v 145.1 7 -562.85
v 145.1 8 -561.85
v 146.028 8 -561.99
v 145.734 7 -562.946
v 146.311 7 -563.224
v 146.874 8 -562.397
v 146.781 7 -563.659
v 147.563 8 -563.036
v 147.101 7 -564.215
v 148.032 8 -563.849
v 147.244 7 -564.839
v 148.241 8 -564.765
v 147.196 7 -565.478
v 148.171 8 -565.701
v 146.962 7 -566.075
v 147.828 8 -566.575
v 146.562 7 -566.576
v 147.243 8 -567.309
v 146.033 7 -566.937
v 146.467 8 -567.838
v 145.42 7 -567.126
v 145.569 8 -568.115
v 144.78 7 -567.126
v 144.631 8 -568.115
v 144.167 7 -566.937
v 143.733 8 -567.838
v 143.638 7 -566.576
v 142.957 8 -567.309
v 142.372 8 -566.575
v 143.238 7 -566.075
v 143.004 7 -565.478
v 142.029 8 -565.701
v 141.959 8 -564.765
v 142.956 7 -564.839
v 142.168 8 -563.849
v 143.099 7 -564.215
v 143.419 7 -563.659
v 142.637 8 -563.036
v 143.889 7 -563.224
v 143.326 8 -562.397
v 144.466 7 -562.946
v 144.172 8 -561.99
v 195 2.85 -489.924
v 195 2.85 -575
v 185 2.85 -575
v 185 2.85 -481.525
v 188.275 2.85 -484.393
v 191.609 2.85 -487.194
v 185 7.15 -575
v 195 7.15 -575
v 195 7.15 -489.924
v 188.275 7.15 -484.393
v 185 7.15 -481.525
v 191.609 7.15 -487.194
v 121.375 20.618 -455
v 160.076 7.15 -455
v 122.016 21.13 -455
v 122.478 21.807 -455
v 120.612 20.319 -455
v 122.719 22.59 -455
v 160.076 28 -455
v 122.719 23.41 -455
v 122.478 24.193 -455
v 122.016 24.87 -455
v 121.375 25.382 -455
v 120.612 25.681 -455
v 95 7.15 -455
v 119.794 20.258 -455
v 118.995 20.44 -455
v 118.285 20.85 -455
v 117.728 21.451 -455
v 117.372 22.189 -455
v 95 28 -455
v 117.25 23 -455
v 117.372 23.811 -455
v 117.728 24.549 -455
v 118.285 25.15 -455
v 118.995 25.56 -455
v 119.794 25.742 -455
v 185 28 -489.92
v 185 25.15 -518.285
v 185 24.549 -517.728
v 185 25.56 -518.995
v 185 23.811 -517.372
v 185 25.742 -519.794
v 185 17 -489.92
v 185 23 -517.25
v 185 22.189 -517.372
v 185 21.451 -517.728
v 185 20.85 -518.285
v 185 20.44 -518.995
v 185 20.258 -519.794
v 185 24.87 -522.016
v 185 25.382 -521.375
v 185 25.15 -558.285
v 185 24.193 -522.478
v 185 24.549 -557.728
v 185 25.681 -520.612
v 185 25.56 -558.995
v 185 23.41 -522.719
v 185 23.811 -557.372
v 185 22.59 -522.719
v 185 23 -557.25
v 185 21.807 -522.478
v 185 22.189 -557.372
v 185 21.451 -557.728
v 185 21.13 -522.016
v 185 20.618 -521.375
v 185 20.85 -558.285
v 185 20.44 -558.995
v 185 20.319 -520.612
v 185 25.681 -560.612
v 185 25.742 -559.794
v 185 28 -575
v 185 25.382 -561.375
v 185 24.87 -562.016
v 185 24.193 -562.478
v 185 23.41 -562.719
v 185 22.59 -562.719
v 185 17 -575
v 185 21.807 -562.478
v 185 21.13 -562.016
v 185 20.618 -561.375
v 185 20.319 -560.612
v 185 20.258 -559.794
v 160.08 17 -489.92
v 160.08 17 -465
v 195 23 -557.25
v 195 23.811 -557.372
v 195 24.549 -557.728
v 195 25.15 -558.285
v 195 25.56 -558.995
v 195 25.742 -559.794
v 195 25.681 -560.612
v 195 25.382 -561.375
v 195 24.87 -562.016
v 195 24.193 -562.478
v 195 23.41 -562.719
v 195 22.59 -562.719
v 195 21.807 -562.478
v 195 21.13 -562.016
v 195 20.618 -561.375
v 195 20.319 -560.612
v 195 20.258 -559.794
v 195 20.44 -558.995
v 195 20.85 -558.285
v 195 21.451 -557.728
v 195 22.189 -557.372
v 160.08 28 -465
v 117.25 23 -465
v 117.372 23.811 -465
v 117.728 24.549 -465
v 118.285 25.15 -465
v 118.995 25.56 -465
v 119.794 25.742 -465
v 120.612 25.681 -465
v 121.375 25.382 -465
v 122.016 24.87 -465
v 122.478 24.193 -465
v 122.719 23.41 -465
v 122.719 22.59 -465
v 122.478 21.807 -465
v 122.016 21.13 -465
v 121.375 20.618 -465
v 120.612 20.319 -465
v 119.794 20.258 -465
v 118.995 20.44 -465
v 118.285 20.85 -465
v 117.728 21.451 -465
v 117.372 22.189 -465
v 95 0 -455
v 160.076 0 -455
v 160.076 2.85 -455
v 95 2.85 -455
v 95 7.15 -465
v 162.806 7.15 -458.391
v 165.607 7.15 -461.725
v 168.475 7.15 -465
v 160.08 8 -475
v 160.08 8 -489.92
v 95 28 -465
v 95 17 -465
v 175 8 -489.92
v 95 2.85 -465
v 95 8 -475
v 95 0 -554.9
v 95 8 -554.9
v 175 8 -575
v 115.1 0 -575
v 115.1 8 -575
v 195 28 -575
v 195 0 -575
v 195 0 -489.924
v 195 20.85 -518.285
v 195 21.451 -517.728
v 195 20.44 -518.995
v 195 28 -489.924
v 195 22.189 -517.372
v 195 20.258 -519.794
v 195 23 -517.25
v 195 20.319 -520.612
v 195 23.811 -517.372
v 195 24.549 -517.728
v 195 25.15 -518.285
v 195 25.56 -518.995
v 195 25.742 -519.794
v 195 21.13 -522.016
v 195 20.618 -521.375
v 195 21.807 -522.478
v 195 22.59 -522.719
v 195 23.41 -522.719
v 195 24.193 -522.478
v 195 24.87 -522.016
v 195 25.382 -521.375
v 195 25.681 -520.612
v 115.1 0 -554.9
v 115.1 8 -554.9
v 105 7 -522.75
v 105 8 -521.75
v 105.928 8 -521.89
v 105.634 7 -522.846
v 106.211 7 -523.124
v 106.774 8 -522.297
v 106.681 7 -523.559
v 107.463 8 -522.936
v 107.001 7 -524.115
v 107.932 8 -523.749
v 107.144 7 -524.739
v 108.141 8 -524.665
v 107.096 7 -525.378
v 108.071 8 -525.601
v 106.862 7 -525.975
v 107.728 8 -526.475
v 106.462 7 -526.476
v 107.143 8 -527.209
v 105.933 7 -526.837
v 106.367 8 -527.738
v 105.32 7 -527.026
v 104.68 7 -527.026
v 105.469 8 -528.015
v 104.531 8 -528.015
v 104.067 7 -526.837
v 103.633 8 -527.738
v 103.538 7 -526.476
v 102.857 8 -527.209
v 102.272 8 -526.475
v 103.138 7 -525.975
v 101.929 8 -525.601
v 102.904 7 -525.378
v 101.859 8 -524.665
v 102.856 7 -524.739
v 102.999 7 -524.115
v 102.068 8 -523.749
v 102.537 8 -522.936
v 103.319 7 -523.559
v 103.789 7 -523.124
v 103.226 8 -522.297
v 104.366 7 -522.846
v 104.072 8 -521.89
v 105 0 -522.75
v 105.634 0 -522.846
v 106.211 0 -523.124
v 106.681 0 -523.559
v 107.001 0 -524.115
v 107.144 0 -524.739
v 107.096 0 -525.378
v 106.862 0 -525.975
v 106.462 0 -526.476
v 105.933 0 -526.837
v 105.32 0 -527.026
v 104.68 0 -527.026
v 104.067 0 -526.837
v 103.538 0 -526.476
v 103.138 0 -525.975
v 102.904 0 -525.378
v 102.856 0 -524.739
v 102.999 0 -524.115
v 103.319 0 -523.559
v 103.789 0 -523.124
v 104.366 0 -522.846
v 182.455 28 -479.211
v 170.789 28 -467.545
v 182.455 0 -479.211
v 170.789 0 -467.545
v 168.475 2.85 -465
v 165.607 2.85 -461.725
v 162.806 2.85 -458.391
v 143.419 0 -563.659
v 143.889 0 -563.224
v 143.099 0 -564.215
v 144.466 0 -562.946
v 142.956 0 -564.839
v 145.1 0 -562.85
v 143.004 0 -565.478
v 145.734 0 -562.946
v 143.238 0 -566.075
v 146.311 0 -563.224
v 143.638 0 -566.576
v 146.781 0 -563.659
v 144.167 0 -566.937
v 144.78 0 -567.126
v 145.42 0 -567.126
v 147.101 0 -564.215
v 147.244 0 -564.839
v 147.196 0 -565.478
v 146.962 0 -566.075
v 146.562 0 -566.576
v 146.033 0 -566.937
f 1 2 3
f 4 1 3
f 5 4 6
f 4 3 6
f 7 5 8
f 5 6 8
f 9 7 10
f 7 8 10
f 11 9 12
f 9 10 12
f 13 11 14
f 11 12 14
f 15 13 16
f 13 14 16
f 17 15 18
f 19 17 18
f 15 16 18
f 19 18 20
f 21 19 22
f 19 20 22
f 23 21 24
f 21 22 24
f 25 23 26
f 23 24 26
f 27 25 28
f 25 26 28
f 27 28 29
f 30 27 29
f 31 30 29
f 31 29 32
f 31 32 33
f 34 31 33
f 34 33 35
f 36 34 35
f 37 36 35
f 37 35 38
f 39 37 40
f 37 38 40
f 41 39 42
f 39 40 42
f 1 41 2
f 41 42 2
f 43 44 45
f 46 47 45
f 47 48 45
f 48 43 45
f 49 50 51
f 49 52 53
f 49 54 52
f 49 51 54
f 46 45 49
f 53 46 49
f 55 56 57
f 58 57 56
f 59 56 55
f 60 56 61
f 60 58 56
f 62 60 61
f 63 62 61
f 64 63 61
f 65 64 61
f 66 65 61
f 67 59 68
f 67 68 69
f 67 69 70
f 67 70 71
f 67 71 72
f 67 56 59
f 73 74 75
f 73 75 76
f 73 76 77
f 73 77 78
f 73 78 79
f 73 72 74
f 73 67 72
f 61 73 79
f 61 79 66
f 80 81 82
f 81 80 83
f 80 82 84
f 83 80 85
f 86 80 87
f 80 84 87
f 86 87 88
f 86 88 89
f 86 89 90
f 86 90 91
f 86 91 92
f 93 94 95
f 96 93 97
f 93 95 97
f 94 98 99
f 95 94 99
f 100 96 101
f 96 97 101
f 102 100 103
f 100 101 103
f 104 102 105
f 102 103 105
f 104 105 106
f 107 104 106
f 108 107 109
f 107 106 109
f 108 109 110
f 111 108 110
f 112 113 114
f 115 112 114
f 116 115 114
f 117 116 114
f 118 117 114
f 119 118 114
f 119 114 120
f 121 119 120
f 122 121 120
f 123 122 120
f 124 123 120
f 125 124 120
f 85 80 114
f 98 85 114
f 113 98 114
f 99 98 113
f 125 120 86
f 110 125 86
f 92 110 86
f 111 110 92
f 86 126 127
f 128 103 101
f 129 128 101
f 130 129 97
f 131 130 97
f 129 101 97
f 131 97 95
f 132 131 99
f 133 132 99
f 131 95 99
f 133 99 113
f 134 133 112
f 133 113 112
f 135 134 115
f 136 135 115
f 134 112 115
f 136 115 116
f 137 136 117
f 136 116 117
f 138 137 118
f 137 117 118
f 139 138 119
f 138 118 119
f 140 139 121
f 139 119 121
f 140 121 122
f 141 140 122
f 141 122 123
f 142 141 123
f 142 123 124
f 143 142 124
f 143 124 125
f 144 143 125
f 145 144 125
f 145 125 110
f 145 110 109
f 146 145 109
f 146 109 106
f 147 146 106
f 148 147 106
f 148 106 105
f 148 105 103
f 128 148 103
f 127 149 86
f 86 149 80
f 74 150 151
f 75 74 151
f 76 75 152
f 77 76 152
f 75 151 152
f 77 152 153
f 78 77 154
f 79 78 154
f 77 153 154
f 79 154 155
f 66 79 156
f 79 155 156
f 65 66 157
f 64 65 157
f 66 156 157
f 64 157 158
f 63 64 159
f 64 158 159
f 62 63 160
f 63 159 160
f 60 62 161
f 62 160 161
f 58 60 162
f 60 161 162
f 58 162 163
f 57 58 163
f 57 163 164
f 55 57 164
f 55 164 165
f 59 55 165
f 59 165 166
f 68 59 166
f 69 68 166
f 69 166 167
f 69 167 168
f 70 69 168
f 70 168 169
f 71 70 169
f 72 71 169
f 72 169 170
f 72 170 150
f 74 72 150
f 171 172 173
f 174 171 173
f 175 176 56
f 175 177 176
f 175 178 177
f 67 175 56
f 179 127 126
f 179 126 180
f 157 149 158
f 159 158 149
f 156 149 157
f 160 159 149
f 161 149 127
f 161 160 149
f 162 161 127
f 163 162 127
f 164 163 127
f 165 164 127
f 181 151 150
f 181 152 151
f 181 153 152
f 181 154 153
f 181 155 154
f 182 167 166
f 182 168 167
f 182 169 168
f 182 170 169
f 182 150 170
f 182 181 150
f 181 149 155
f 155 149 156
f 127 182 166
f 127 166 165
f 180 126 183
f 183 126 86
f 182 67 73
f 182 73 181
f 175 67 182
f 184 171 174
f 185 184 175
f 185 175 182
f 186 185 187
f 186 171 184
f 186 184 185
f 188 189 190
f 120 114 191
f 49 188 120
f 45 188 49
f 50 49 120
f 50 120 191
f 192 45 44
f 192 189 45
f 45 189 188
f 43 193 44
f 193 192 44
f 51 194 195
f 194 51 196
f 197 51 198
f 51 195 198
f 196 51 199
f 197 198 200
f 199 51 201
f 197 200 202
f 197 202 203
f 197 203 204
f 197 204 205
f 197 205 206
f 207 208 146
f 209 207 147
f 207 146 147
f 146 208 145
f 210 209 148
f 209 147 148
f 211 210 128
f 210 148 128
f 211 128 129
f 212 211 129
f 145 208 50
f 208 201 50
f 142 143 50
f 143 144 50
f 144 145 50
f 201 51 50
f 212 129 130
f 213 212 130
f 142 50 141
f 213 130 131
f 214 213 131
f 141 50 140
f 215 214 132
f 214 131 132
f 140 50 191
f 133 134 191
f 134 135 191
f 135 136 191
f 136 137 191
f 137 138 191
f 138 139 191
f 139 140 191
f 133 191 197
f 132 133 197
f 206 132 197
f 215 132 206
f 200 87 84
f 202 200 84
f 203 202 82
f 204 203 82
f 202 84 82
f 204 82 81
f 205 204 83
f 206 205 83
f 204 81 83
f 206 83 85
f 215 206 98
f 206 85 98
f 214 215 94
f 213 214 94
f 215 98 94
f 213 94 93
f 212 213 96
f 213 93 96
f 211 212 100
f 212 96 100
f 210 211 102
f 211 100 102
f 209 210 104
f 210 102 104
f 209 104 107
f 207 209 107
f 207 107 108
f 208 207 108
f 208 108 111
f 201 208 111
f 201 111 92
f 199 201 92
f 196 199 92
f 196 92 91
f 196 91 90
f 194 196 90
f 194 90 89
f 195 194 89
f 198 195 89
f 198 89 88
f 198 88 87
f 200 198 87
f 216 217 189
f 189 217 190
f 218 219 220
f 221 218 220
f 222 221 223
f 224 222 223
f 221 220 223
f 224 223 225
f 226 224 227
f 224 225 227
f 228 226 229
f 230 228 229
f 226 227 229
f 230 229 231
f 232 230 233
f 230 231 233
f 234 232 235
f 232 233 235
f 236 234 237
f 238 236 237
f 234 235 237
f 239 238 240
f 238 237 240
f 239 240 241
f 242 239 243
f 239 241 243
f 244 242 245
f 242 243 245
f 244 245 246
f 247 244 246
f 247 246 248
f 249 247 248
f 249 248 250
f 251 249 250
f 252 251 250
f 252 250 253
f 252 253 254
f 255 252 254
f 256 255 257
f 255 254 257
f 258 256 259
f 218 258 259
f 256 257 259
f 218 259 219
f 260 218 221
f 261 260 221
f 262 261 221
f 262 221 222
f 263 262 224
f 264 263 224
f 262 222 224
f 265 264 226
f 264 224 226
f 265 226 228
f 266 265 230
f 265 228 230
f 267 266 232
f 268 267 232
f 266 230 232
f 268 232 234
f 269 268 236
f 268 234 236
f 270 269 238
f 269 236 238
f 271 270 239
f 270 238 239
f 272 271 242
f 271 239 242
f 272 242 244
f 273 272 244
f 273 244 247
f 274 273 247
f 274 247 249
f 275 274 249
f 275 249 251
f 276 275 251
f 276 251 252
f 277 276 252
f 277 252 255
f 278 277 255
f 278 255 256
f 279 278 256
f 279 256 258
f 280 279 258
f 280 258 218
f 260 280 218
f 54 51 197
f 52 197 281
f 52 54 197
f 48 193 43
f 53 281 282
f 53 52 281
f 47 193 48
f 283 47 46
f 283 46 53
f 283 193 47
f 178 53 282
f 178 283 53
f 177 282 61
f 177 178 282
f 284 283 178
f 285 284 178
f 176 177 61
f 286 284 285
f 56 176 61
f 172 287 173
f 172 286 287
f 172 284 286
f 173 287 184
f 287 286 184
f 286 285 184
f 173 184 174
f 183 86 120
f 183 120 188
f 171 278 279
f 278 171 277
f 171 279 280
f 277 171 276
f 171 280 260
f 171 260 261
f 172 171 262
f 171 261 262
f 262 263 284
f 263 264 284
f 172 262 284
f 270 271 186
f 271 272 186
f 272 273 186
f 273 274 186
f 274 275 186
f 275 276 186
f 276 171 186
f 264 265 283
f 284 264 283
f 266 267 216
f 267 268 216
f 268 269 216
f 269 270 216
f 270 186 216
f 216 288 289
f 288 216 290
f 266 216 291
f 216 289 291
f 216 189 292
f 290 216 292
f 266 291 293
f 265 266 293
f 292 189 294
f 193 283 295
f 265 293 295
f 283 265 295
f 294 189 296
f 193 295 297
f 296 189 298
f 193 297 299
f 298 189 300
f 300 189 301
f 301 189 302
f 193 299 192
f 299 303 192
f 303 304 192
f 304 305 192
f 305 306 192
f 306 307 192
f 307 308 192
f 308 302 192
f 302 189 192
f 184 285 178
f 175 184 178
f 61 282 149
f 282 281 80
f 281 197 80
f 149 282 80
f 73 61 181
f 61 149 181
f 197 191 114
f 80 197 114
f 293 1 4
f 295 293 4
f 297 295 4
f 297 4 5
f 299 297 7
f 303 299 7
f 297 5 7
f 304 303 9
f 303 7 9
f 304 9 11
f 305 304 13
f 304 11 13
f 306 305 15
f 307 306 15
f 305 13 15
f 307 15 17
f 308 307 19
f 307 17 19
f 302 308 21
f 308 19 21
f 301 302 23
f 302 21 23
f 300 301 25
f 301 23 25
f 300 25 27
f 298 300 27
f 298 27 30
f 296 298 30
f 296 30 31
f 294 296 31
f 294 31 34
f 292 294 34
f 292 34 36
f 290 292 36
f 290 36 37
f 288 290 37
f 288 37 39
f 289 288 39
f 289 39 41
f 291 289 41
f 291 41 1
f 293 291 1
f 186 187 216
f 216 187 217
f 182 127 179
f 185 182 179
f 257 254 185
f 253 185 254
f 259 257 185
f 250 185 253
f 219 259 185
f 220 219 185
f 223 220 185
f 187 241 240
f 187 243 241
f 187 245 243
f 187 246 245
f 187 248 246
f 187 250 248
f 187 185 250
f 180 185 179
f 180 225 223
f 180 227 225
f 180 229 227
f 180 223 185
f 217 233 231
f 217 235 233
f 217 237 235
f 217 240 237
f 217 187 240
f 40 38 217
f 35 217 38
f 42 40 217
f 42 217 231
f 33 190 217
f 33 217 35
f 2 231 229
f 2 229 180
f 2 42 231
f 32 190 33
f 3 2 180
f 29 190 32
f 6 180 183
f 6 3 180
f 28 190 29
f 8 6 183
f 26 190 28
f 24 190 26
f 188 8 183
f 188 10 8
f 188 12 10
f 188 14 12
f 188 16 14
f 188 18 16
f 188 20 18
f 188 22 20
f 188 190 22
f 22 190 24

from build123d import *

# Parameters (mm, degrees)
SKETCH1_W                = 650
SKETCH1_H                = 650
BOSS_EXTRUDE1_DEPTH      = 8
BOSS_EXTRUDE2_DEPTH      = 650
CUT_EXTRUDE2_DEPTH       = 921.277302922
CUT_EXTRUDE2_DEPTH_BACK  = 921.277302922
SKETCH4_R                = 11
CUT_EXTRUDE1_DEPTH       = 920.932062709
CUT_EXTRUDE1_DEPTH_BACK  = 920.932062709
SKETCH2_R                = 210
CUT_EXTRUDE3_DEPTH       = 921.277302998
CUT_EXTRUDE3_DEPTH_BACK  = 110
CUT_EXTRUDE4_DEPTH       = 110
CUT_EXTRUDE5_DEPTH       = 920.932062713
CUT_EXTRUDE5_DEPTH_BACK  = 920.932062713
SKETCH7_OUTSIDE_W        = 836.056
SKETCH7_OUTSIDE_H        = 836.056
BOSS_EXTRUDE3_DEPTH      = 160.08
BOSS_EXTRUDE4_DEPTH      = 160.08
SKETCH21_W               = 10
SKETCH21_H               = 4.3
CUT_EXTRUDE10_DEPTH      = 680.197320372
SKETCH22_W               = 10
SKETCH22_H               = 4.3
CUT_EXTRUDE11_DEPTH      = 278.189465889
BOSS_EXTRUDE5_DEPTH      = 60
CUT_EXTRUDE6_DEPTH       = 679.914574891
CUT_EXTRUDE6_DEPTH_BACK  = 679.914574891
SKETCH12_R               = 210
CUT_EXTRUDE14_DEPTH      = 11
SKETCH27_R               = 2.2
SKETCH27_R_2             = 2.75
CUT_EXTRUDE15_DEPTH      = 11
SKETCH28_R               = 2.75
SKETCH28_R_2             = 2.2
CUT_EXTRUDE16_DEPTH      = 11
SKETCH29_W               = 20
SKETCH29_H               = 20
CUT_EXTRUDE17_DEPTH      = 10
CUT_EXTRUDE18_DEPTH      = 679.914574891
CUT_EXTRUDE18_DEPTH_BACK = 679.914574891
SKETCH30_W               = 95
SKETCH30_H               = 195
CUT_EXTRUDE19_DEPTH      = 679.914574891
CUT_EXTRUDE19_DEPTH_BACK = 679.914574891
SKETCH31_W               = 100
SKETCH31_H               = 75
SKETCH32_W               = 20.1
SKETCH32_H               = 20.1
CUT_EXTRUDE20_DEPTH      = 10
SKETCH33_R               = 2.15
CUT_EXTRUDE21_DEPTH      = 10
CHAMFER1_SIZE            = 1


with BuildPart() as part:
    # Sketch1 → Boss-Extrude1 (new body)
    with BuildSketch(Plane(origin=(0, 0, 0), x_dir=(1, 0, 0), z_dir=(0, 1, 0))):
        with Locations((325, 325)):
            Rectangle(SKETCH1_W, SKETCH1_H)
    extrude(amount=BOSS_EXTRUDE1_DEPTH)

    # Sketch3 → Boss-Extrude2 (add)
    with BuildSketch(Plane.XY):
        Polygon((300, 43.707142143), (350, 43.707142143), (385, 8), (265, 8), align=None)
    extrude(amount=-BOSS_EXTRUDE2_DEPTH)

    # Sketch4 → Cut-Extrude2 (cut, two sides: drawn at the far end of the back side and taken through both)
    with BuildSketch(Plane.XY.offset(-CUT_EXTRUDE2_DEPTH_BACK)):
        with Locations((325, 22)):
            Circle(SKETCH4_R)
    extrude(amount=CUT_EXTRUDE2_DEPTH + CUT_EXTRUDE2_DEPTH_BACK, mode=Mode.SUBTRACT)

    # Sketch2 → Cut-Extrude1 (cut, two sides: drawn at the far end of the back side and taken through both)
    with BuildSketch(Plane(origin=(0, 8, 0), x_dir=(1, 0, 0), z_dir=(0, 1, 0)).offset(-CUT_EXTRUDE1_DEPTH_BACK)):
        with Locations(Location((325, 325, 0), (0, 0, 270))):
            Circle(SKETCH2_R)
    extrude(amount=CUT_EXTRUDE1_DEPTH + CUT_EXTRUDE1_DEPTH_BACK, mode=Mode.SUBTRACT)

    # Sketch5 → Cut-Extrude3 (cut, two sides: drawn at the far end of the back side and taken through both)
    with BuildSketch(Plane.XY.offset(-CUT_EXTRUDE3_DEPTH_BACK)):
        Polygon((300, 43.707142143), (350, 43.707142143), (365.396078824, 28), (350, 28), (350, 8), (300, 8), (300, 28), (284.603921176, 28), align=None)
    extrude(amount=CUT_EXTRUDE3_DEPTH + CUT_EXTRUDE3_DEPTH_BACK, mode=Mode.SUBTRACT)

    # Sketch6 → Cut-Extrude4 (cut)
    with BuildSketch(Plane(origin=(0, 0, -650), x_dir=(-1, 0, 0), z_dir=(0, 0, -1))):
        Polygon((-350, 43.707142143), (-300, 43.707142143), (-284.603921176, 28), (-300, 28), (-300, 8), (-350, 8), (-350, 28), (-365.396078824, 28), align=None)
    extrude(amount=-CUT_EXTRUDE4_DEPTH, mode=Mode.SUBTRACT)

    # Sketch7 outside → Cut-Extrude5 (cut, two sides: drawn at the far end of the back side and taken through both)
    with BuildSketch(Plane(origin=(0, 8, 0), x_dir=(1, 0, 0), z_dir=(0, 1, 0)).offset(-CUT_EXTRUDE5_DEPTH_BACK)):
        with Locations((325, 325)):
            Rectangle(SKETCH7_OUTSIDE_W, SKETCH7_OUTSIDE_H)
        Polygon((195, 455), (195, 489.924225025), (195, 650), (167.478198198, 686.544504505), (-70.838918919, 686.544504505), (-70.838918919, 472.462112512), (0, 455), (160.075774975, 455), align=None, mode=Mode.SUBTRACT)
    extrude(amount=CUT_EXTRUDE5_DEPTH + CUT_EXTRUDE5_DEPTH_BACK, mode=Mode.SUBTRACT)

    # Sketch8 → Boss-Extrude3 (add)
    with BuildSketch(Plane(origin=(0, 0, -650), x_dir=(-1, 0, 0), z_dir=(0, 0, -1))):
        Polygon((-195, 8), (-195, 28), (-185, 28), (-185, 17), (-175, 8), align=None)
    extrude(amount=-BOSS_EXTRUDE3_DEPTH)

    # Sketch10 → Boss-Extrude4 (add)
    with BuildSketch(Plane.ZY):
        Polygon((-455, 8), (-455, 28), (-465, 28), (-465, 17), (-475, 8), align=None)
    extrude(amount=-BOSS_EXTRUDE4_DEPTH)

    # Sketch21 → Cut-Extrude10 (cut, through all)
    with BuildSketch(Plane.ZY):
        with Locations((-460, 5)):
            Rectangle(SKETCH21_W, SKETCH21_H)
    extrude(amount=-CUT_EXTRUDE10_DEPTH, mode=Mode.SUBTRACT)

    # Sketch22 → Cut-Extrude11 (cut, through all)
    with BuildSketch(Plane(origin=(0, 0, -650), x_dir=(-1, 0, 0), z_dir=(0, 0, -1))):
        with Locations((-190, 5)):
            Rectangle(SKETCH22_W, SKETCH22_H)
    extrude(amount=-CUT_EXTRUDE11_DEPTH, mode=Mode.SUBTRACT)

    # Sketch23 → Boss-Extrude5 (add)
    with BuildSketch(Plane.XY.offset(-489.92)):
        Polygon((194.99464011, 8), (195, 28), (160.08, 28), (160.08, 8), align=None)
    extrude(amount=BOSS_EXTRUDE5_DEPTH)

    # Sketch12 → Cut-Extrude6 (cut, two sides: drawn at the far end of the back side and taken through both)
    with BuildSketch(Plane(origin=(0, 8, 0), x_dir=(1, 0, 0), z_dir=(0, 1, 0)).offset(-CUT_EXTRUDE6_DEPTH_BACK)):
        with Locations((325, 325)):
            Circle(SKETCH12_R)
    extrude(amount=CUT_EXTRUDE6_DEPTH + CUT_EXTRUDE6_DEPTH_BACK, mode=Mode.SUBTRACT)

    # Sketch26 → Cut-Extrude14 (cut)
    with BuildSketch(Plane(origin=(0, 28, 0), x_dir=(1, 0, 0), z_dir=(0, 1, 0))):
        Polygon((185, 489.92), (160.08, 489.92), (160.08, 465), align=None)
    extrude(amount=-CUT_EXTRUDE14_DEPTH, mode=Mode.SUBTRACT)

    # Sketch27 → Cut-Extrude15 (cut)
    with BuildSketch(Plane.ZY.offset(-185)):
        with Locations((-610, 23)):
            Circle(SKETCH27_R)
        with Locations((-560, 23)):
            Circle(SKETCH27_R_2)
        with Locations((-520, 23)):
            Circle(SKETCH27_R_2)
    extrude(amount=-CUT_EXTRUDE15_DEPTH, mode=Mode.SUBTRACT)

    # Sketch28 → Cut-Extrude16 (cut)
    with BuildSketch(Plane(origin=(0, 0, -465), x_dir=(-1, 0, 0), z_dir=(0, 0, -1))):
        with Locations((-120, 23)):
            Circle(SKETCH28_R)
        with Locations((-80, 23)):
            Circle(SKETCH28_R_2)
        with Locations((-40, 23)):
            Circle(SKETCH28_R_2)
    extrude(amount=-CUT_EXTRUDE16_DEPTH, mode=Mode.SUBTRACT)

    # Sketch29 → Cut-Extrude17 (cut)
    with BuildSketch(Plane(origin=(0, 8, 0), x_dir=(1, 0, 0), z_dir=(0, 1, 0))):
        with Locations((10, 640)):
            Rectangle(SKETCH29_W, SKETCH29_H)
    extrude(amount=-CUT_EXTRUDE17_DEPTH, mode=Mode.SUBTRACT)

    # Sketch30 → Cut-Extrude18 (cut, two sides: drawn at the far end of the back side and taken through both)
    with BuildSketch(Plane(origin=(0, 8, 0), x_dir=(1, 0, 0), z_dir=(0, 1, 0)).offset(-CUT_EXTRUDE18_DEPTH_BACK)):
        with Locations((47.5, 552.5)):
            Rectangle(SKETCH30_W, SKETCH30_H)
    extrude(amount=CUT_EXTRUDE18_DEPTH + CUT_EXTRUDE18_DEPTH_BACK, mode=Mode.SUBTRACT)

    # Sketch31 → Cut-Extrude19 (cut, two sides: drawn at the far end of the back side and taken through both)
    with BuildSketch(Plane(origin=(0, 8, 0), x_dir=(1, 0, 0), z_dir=(0, 1, 0)).offset(-CUT_EXTRUDE19_DEPTH_BACK)):
        with Locations((145, 612.5)):
            Rectangle(SKETCH31_W, SKETCH31_H)
    extrude(amount=CUT_EXTRUDE19_DEPTH + CUT_EXTRUDE19_DEPTH_BACK, mode=Mode.SUBTRACT)

    # Sketch32 → Cut-Extrude20 (cut)
    with BuildSketch(Plane(origin=(0, 8, 0), x_dir=(1, 0, 0), z_dir=(0, 1, 0))):
        with Locations((105.05, 564.95)):
            Rectangle(SKETCH32_W, SKETCH32_H)
    extrude(amount=-CUT_EXTRUDE20_DEPTH, mode=Mode.SUBTRACT)

    # Sketch33 → Cut-Extrude21 (cut)
    with BuildSketch(Plane(origin=(0, 8, 0), x_dir=(1, 0, 0), z_dir=(0, 1, 0))):
        with Locations(Location((105, 524.9, 0), (0, 0, 270))):
            Circle(SKETCH33_R)
        with Locations(Location((145.1, 565, 0), (0, 0, 270))):
            Circle(SKETCH33_R)
    extrude(amount=-CUT_EXTRUDE21_DEPTH, mode=Mode.SUBTRACT)

    # Chamfer1
    chamfer1_edges = [part.edges().sort_by_distance(p)[0] for p in [
        (105, 8, -527.05),
        (145.1, 8, -567.15),
    ]]
    chamfer(chamfer1_edges, length=CHAMFER1_SIZE)


solid = part.part
